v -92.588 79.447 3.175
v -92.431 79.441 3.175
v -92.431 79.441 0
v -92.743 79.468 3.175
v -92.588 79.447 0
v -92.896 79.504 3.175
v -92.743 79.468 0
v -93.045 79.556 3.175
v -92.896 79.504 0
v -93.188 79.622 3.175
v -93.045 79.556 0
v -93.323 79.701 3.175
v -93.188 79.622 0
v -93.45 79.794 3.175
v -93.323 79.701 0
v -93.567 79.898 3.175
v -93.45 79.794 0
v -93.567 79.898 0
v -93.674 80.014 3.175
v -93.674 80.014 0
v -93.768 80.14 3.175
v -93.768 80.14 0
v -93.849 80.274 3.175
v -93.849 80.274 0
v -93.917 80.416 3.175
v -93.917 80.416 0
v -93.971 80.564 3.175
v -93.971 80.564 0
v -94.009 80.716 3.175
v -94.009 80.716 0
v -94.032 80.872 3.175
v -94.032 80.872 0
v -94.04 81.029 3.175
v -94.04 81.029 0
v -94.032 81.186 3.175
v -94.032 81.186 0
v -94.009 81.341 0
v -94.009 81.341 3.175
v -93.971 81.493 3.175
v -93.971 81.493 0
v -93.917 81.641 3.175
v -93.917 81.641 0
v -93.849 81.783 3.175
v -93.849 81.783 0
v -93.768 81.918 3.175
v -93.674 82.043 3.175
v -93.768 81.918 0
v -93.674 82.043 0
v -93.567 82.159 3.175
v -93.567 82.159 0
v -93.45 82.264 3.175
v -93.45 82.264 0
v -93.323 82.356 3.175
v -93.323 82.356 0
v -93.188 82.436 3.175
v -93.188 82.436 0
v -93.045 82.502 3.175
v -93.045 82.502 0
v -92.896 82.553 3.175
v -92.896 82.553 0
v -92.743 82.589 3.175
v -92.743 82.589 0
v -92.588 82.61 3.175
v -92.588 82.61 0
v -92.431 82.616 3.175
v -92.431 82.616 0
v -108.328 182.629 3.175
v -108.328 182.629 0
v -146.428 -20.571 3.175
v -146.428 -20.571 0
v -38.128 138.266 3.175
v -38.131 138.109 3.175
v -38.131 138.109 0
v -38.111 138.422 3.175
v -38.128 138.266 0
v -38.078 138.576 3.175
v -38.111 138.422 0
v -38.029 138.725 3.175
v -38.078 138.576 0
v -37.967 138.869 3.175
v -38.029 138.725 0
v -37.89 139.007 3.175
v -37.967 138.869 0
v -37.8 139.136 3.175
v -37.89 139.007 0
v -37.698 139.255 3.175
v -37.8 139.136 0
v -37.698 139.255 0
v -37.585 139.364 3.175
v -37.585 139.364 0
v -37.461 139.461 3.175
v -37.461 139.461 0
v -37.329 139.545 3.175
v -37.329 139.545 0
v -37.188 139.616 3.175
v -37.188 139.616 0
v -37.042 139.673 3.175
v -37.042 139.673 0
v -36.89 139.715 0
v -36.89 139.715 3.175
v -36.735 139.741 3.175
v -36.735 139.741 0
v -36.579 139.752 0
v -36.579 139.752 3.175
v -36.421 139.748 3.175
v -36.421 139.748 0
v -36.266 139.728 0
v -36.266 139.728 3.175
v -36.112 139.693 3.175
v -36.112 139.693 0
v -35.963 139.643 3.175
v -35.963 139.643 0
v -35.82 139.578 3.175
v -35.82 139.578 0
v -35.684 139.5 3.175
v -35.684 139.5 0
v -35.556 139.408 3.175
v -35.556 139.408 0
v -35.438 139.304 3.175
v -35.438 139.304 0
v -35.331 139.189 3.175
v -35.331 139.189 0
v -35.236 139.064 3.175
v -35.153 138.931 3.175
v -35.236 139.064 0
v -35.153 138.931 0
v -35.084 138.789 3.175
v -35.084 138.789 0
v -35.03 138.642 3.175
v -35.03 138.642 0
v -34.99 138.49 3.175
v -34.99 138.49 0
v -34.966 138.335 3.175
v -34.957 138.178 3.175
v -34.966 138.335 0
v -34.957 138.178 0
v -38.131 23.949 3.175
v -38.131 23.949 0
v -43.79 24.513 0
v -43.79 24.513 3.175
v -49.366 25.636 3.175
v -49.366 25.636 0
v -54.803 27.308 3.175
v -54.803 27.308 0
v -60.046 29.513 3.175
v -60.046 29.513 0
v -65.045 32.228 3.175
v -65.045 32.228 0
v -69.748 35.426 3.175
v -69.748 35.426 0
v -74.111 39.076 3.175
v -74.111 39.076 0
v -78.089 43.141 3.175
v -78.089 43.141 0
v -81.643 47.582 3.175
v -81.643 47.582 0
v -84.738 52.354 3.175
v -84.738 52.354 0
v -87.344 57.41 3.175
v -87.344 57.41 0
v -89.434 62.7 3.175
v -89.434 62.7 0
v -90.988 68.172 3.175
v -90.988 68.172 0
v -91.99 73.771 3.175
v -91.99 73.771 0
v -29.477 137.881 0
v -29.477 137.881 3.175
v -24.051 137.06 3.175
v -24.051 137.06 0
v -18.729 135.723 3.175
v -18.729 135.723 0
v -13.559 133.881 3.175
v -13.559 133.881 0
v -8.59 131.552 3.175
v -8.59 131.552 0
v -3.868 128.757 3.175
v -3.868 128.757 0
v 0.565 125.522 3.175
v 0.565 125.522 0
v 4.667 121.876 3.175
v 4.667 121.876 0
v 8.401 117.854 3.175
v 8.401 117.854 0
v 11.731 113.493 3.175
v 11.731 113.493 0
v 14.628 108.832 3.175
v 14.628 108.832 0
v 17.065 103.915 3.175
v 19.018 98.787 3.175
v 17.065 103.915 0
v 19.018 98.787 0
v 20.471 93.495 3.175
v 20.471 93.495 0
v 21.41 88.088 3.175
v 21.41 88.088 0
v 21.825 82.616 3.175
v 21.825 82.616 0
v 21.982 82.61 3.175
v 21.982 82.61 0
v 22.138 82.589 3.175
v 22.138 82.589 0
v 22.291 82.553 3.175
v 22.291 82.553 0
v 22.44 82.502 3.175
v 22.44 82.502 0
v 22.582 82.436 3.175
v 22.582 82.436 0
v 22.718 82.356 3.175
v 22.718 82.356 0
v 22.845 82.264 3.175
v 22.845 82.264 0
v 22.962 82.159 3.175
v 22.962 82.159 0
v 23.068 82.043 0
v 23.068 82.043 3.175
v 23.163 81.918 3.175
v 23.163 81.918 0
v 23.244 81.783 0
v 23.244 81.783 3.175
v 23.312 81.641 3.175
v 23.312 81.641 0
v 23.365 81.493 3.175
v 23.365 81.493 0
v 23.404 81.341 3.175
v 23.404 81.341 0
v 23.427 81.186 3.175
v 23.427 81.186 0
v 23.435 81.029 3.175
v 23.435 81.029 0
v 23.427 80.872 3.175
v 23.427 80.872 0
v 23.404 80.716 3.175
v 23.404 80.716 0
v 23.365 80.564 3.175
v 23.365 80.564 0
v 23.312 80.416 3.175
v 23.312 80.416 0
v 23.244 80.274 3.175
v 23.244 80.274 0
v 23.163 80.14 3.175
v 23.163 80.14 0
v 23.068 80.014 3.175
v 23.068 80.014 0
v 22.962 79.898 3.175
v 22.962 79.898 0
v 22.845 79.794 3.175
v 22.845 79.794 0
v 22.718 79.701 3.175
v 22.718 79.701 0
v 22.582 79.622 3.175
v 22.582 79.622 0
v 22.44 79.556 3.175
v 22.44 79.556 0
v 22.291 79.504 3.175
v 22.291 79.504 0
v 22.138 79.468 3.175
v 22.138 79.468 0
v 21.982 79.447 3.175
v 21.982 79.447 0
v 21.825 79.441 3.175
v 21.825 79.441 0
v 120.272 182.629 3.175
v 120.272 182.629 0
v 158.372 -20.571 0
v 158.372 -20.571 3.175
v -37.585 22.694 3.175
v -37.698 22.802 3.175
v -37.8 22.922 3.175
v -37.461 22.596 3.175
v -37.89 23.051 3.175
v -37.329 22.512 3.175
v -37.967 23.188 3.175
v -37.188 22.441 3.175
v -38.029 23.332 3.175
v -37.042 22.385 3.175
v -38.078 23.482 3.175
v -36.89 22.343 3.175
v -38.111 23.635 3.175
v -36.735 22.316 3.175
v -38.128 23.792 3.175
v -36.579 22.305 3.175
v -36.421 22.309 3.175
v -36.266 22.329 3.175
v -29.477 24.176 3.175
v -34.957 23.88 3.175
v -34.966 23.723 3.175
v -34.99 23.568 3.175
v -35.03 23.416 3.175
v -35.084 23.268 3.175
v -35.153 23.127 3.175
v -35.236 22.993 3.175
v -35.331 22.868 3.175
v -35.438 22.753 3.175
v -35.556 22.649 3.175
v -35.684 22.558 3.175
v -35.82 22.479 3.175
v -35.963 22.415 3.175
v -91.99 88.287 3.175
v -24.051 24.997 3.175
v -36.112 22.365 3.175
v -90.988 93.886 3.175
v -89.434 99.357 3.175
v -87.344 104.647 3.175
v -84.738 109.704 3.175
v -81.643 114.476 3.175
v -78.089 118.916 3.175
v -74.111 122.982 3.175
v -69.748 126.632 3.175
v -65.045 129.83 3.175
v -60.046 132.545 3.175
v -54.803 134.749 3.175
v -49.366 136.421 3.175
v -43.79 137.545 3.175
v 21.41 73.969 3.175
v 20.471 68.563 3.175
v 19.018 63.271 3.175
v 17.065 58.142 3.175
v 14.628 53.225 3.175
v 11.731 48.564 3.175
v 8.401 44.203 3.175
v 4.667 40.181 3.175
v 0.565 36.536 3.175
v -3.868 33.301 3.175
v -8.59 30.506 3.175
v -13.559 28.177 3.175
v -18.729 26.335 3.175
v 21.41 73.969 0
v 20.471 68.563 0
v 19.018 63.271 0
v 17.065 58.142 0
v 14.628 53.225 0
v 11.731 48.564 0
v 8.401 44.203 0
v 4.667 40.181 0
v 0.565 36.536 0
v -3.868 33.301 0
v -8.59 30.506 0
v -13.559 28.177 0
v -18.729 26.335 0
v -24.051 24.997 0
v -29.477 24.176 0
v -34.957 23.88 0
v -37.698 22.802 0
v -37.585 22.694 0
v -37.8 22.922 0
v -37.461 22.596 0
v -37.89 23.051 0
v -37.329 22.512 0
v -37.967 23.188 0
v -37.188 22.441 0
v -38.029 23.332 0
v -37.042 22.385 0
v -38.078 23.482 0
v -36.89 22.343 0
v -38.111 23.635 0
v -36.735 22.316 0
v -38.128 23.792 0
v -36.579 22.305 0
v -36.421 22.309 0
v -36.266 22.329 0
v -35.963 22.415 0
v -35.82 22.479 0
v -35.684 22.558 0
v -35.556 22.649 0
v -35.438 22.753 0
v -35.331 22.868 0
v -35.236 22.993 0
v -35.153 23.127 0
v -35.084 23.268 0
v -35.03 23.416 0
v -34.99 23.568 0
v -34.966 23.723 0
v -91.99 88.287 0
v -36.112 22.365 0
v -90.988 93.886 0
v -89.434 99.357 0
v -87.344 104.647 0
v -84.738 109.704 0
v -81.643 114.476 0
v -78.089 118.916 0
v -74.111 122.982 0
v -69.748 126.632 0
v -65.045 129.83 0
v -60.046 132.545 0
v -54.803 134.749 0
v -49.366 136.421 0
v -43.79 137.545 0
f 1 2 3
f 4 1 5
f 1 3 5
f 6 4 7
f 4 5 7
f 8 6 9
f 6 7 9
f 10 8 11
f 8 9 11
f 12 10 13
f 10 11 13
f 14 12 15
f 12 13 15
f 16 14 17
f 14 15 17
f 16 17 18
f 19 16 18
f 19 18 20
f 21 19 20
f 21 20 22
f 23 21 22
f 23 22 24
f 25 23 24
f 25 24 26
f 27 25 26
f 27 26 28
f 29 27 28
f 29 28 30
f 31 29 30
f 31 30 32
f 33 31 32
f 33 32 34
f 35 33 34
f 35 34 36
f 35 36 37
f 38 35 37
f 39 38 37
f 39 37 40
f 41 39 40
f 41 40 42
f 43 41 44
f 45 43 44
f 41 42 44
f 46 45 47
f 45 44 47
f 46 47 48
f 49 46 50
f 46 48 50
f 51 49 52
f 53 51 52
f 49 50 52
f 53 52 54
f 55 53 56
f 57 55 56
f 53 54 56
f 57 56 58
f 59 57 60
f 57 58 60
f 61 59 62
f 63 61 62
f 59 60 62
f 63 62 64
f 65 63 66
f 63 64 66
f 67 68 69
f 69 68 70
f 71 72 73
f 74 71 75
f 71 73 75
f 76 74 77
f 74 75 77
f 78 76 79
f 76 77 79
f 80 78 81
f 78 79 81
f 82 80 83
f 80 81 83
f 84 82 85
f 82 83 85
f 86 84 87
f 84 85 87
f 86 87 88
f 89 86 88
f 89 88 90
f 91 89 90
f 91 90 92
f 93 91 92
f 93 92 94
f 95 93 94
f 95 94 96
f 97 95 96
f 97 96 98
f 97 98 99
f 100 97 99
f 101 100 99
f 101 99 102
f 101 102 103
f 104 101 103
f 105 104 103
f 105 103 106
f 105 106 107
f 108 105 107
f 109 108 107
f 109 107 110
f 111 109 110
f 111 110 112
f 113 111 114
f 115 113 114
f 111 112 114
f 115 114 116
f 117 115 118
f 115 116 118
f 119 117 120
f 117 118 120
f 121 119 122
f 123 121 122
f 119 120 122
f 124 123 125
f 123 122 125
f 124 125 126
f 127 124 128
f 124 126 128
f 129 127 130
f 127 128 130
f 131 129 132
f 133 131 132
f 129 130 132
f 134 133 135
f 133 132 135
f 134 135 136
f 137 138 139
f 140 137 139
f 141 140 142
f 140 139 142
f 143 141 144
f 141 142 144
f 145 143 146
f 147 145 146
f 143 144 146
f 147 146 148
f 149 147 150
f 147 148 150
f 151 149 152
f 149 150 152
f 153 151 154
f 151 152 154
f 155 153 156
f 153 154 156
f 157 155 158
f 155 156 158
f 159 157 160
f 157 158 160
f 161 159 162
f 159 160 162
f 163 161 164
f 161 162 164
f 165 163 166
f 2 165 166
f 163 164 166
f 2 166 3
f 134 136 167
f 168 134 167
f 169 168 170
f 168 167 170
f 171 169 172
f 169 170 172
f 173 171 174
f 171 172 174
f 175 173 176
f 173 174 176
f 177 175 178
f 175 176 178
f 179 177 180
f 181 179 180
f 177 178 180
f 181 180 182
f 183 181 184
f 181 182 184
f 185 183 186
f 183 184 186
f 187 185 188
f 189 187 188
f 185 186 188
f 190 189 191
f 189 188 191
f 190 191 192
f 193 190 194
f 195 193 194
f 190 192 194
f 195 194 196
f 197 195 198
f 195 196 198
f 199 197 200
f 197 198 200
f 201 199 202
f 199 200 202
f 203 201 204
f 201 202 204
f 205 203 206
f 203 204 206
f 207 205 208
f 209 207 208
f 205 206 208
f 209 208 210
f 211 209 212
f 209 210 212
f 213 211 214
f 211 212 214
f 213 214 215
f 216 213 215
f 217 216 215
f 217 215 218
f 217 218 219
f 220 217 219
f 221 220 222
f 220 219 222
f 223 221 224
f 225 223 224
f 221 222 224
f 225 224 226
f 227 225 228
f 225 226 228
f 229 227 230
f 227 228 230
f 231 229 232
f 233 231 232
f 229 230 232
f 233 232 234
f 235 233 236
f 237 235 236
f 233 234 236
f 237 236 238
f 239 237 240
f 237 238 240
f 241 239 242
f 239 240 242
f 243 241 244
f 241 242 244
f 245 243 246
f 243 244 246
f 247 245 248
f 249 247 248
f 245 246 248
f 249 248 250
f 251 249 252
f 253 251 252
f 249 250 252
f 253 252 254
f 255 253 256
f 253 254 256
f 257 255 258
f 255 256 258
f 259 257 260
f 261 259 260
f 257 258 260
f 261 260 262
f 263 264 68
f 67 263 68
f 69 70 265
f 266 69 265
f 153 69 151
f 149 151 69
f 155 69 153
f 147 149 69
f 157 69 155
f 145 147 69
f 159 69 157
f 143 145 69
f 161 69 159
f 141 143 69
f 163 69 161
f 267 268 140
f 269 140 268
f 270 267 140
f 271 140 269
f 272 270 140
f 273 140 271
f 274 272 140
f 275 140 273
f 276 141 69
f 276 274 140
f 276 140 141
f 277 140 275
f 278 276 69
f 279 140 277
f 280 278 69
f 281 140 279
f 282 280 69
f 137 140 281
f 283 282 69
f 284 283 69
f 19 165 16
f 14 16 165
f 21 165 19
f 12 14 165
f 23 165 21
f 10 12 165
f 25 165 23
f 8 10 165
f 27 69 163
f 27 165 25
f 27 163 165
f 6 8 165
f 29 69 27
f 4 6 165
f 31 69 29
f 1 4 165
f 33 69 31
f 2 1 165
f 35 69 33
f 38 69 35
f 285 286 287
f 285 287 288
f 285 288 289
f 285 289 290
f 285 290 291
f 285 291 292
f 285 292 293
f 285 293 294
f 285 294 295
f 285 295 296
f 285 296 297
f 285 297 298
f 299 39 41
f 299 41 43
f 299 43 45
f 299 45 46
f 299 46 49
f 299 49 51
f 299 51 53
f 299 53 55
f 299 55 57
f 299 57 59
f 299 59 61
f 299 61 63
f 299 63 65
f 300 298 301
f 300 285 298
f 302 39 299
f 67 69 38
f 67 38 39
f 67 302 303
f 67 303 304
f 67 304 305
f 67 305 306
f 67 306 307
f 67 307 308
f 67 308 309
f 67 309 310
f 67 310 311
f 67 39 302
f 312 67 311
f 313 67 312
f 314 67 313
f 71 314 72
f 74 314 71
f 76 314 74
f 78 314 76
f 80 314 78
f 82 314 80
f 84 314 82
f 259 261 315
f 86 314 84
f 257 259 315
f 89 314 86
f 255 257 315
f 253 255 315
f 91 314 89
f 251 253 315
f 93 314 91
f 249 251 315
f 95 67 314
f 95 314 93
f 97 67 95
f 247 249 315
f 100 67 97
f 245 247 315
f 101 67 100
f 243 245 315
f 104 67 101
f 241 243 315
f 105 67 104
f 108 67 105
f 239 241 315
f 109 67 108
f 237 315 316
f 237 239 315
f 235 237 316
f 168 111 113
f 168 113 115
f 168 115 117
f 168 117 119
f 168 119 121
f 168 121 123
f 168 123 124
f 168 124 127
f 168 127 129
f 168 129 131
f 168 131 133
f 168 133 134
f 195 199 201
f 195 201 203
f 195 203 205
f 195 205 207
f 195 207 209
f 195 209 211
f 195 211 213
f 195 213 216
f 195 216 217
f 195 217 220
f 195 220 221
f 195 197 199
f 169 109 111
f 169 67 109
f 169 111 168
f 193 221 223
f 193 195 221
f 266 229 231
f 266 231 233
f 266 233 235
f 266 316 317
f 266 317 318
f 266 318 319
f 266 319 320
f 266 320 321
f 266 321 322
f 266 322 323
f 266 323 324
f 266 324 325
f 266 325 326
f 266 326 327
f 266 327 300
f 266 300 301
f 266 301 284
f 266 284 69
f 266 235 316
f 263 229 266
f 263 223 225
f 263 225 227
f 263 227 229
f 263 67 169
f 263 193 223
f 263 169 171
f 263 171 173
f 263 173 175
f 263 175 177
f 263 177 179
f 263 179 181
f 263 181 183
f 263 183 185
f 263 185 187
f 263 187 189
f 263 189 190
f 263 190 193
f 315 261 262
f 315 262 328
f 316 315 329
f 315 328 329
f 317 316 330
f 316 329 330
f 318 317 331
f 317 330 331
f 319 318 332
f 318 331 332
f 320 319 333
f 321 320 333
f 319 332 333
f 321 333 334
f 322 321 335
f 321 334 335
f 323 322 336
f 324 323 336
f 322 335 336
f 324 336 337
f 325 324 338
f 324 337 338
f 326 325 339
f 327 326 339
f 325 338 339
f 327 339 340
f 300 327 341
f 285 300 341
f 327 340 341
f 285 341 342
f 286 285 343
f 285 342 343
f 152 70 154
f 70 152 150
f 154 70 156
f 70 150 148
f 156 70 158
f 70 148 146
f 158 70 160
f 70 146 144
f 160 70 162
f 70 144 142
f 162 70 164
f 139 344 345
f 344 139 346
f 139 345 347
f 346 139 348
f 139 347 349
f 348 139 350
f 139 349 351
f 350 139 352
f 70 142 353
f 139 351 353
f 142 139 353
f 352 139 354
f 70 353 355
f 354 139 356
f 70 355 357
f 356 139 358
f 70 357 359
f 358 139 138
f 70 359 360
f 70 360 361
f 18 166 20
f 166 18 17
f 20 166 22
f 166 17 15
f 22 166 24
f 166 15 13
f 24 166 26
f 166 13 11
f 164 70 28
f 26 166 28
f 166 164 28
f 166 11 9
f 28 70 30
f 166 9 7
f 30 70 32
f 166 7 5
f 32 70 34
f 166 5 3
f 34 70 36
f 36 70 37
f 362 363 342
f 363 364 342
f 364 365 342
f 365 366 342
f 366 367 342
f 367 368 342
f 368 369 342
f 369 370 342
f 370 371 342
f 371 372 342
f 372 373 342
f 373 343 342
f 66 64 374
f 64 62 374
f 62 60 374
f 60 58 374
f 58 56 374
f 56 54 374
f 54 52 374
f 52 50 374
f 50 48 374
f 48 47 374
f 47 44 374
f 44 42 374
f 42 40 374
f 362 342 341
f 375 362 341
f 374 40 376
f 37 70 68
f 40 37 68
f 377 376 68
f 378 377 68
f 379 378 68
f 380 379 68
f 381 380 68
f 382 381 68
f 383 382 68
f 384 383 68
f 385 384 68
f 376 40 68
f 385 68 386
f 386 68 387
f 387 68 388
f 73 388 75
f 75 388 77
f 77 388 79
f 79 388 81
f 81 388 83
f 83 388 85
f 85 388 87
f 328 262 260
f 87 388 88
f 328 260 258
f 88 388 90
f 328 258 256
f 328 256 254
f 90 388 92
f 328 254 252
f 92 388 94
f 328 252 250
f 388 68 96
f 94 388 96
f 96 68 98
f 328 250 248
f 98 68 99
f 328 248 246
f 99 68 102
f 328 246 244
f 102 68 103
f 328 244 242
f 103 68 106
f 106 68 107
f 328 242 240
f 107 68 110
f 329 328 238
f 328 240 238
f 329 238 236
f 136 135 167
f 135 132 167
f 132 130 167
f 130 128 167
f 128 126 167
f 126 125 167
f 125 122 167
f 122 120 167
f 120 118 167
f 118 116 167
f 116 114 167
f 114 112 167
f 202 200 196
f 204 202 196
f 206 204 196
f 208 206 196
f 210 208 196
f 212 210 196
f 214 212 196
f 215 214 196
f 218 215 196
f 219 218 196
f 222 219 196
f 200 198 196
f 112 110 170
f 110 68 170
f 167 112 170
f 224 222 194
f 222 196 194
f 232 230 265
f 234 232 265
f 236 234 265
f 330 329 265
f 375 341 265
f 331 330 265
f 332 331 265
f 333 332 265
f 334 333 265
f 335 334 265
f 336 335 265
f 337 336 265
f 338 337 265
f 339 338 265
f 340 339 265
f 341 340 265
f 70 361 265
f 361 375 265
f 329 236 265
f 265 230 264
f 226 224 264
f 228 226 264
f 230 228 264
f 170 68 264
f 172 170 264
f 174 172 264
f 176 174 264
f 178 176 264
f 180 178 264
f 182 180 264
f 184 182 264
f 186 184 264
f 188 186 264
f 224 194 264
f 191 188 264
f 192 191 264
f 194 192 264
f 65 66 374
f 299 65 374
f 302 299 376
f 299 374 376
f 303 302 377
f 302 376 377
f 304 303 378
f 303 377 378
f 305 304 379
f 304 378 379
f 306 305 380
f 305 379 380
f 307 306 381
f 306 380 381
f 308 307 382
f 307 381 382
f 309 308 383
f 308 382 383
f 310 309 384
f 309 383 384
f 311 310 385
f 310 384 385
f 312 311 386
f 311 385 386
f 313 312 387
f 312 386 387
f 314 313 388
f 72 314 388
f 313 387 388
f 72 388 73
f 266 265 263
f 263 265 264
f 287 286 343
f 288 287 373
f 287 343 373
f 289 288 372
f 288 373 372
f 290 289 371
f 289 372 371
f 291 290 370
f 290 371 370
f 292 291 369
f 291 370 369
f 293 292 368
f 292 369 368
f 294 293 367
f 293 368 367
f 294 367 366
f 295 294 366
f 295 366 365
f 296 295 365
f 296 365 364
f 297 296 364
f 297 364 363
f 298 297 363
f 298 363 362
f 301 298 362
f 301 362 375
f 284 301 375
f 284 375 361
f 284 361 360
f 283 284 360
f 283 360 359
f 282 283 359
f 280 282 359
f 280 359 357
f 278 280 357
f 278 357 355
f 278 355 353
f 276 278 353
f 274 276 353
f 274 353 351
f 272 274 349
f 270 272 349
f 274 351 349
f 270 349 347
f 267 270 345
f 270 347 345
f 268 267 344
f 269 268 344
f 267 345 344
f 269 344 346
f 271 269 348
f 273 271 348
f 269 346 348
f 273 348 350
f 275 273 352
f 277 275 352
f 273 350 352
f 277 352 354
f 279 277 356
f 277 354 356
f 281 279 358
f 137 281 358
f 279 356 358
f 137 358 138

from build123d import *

# Parameters (mm, degrees)
F1_DEPTH = 3.175
F3_D     = 3.175
F3_DEPTH = 17.4625


with BuildPart() as f1:
    # F0 (on Top) → F1 (new body)
    with BuildSketch(Plane.XY):
        Polygon((-108.327691, 182.628707), (-146.427691, -20.571293), (158.372309, -20.571293), (120.272309, 182.628707), (5.972309, 182.628707), align=None)
        with BuildLine():
            ThreePointArc((-35.302691, 138.178707), (5.108462, 121.439859), (21.847309, 81.028707))
            ThreePointArc((21.847309, 81.028707), (5.108462, 40.617554), (-35.302691, 23.878707))
            ThreePointArc((-35.302691, 23.878707), (-75.713844, 40.617554), (-92.452691, 81.028707))
            ThreePointArc((-92.452691, 81.028707), (-75.713844, 121.439859), (-35.302691, 138.178707))
        make_face(mode=Mode.SUBTRACT)
    extrude(amount=F1_DEPTH)

    # F3
    with Locations(Plane.XY.offset(3.175)):
        with Locations((-36.544064, 138.165223), (21.847309, 81.028707), (-36.544064, 23.89219), (-92.452691, 81.028707)):
            Hole(F3_D / 2, depth=F3_DEPTH)


solid = f1.part
